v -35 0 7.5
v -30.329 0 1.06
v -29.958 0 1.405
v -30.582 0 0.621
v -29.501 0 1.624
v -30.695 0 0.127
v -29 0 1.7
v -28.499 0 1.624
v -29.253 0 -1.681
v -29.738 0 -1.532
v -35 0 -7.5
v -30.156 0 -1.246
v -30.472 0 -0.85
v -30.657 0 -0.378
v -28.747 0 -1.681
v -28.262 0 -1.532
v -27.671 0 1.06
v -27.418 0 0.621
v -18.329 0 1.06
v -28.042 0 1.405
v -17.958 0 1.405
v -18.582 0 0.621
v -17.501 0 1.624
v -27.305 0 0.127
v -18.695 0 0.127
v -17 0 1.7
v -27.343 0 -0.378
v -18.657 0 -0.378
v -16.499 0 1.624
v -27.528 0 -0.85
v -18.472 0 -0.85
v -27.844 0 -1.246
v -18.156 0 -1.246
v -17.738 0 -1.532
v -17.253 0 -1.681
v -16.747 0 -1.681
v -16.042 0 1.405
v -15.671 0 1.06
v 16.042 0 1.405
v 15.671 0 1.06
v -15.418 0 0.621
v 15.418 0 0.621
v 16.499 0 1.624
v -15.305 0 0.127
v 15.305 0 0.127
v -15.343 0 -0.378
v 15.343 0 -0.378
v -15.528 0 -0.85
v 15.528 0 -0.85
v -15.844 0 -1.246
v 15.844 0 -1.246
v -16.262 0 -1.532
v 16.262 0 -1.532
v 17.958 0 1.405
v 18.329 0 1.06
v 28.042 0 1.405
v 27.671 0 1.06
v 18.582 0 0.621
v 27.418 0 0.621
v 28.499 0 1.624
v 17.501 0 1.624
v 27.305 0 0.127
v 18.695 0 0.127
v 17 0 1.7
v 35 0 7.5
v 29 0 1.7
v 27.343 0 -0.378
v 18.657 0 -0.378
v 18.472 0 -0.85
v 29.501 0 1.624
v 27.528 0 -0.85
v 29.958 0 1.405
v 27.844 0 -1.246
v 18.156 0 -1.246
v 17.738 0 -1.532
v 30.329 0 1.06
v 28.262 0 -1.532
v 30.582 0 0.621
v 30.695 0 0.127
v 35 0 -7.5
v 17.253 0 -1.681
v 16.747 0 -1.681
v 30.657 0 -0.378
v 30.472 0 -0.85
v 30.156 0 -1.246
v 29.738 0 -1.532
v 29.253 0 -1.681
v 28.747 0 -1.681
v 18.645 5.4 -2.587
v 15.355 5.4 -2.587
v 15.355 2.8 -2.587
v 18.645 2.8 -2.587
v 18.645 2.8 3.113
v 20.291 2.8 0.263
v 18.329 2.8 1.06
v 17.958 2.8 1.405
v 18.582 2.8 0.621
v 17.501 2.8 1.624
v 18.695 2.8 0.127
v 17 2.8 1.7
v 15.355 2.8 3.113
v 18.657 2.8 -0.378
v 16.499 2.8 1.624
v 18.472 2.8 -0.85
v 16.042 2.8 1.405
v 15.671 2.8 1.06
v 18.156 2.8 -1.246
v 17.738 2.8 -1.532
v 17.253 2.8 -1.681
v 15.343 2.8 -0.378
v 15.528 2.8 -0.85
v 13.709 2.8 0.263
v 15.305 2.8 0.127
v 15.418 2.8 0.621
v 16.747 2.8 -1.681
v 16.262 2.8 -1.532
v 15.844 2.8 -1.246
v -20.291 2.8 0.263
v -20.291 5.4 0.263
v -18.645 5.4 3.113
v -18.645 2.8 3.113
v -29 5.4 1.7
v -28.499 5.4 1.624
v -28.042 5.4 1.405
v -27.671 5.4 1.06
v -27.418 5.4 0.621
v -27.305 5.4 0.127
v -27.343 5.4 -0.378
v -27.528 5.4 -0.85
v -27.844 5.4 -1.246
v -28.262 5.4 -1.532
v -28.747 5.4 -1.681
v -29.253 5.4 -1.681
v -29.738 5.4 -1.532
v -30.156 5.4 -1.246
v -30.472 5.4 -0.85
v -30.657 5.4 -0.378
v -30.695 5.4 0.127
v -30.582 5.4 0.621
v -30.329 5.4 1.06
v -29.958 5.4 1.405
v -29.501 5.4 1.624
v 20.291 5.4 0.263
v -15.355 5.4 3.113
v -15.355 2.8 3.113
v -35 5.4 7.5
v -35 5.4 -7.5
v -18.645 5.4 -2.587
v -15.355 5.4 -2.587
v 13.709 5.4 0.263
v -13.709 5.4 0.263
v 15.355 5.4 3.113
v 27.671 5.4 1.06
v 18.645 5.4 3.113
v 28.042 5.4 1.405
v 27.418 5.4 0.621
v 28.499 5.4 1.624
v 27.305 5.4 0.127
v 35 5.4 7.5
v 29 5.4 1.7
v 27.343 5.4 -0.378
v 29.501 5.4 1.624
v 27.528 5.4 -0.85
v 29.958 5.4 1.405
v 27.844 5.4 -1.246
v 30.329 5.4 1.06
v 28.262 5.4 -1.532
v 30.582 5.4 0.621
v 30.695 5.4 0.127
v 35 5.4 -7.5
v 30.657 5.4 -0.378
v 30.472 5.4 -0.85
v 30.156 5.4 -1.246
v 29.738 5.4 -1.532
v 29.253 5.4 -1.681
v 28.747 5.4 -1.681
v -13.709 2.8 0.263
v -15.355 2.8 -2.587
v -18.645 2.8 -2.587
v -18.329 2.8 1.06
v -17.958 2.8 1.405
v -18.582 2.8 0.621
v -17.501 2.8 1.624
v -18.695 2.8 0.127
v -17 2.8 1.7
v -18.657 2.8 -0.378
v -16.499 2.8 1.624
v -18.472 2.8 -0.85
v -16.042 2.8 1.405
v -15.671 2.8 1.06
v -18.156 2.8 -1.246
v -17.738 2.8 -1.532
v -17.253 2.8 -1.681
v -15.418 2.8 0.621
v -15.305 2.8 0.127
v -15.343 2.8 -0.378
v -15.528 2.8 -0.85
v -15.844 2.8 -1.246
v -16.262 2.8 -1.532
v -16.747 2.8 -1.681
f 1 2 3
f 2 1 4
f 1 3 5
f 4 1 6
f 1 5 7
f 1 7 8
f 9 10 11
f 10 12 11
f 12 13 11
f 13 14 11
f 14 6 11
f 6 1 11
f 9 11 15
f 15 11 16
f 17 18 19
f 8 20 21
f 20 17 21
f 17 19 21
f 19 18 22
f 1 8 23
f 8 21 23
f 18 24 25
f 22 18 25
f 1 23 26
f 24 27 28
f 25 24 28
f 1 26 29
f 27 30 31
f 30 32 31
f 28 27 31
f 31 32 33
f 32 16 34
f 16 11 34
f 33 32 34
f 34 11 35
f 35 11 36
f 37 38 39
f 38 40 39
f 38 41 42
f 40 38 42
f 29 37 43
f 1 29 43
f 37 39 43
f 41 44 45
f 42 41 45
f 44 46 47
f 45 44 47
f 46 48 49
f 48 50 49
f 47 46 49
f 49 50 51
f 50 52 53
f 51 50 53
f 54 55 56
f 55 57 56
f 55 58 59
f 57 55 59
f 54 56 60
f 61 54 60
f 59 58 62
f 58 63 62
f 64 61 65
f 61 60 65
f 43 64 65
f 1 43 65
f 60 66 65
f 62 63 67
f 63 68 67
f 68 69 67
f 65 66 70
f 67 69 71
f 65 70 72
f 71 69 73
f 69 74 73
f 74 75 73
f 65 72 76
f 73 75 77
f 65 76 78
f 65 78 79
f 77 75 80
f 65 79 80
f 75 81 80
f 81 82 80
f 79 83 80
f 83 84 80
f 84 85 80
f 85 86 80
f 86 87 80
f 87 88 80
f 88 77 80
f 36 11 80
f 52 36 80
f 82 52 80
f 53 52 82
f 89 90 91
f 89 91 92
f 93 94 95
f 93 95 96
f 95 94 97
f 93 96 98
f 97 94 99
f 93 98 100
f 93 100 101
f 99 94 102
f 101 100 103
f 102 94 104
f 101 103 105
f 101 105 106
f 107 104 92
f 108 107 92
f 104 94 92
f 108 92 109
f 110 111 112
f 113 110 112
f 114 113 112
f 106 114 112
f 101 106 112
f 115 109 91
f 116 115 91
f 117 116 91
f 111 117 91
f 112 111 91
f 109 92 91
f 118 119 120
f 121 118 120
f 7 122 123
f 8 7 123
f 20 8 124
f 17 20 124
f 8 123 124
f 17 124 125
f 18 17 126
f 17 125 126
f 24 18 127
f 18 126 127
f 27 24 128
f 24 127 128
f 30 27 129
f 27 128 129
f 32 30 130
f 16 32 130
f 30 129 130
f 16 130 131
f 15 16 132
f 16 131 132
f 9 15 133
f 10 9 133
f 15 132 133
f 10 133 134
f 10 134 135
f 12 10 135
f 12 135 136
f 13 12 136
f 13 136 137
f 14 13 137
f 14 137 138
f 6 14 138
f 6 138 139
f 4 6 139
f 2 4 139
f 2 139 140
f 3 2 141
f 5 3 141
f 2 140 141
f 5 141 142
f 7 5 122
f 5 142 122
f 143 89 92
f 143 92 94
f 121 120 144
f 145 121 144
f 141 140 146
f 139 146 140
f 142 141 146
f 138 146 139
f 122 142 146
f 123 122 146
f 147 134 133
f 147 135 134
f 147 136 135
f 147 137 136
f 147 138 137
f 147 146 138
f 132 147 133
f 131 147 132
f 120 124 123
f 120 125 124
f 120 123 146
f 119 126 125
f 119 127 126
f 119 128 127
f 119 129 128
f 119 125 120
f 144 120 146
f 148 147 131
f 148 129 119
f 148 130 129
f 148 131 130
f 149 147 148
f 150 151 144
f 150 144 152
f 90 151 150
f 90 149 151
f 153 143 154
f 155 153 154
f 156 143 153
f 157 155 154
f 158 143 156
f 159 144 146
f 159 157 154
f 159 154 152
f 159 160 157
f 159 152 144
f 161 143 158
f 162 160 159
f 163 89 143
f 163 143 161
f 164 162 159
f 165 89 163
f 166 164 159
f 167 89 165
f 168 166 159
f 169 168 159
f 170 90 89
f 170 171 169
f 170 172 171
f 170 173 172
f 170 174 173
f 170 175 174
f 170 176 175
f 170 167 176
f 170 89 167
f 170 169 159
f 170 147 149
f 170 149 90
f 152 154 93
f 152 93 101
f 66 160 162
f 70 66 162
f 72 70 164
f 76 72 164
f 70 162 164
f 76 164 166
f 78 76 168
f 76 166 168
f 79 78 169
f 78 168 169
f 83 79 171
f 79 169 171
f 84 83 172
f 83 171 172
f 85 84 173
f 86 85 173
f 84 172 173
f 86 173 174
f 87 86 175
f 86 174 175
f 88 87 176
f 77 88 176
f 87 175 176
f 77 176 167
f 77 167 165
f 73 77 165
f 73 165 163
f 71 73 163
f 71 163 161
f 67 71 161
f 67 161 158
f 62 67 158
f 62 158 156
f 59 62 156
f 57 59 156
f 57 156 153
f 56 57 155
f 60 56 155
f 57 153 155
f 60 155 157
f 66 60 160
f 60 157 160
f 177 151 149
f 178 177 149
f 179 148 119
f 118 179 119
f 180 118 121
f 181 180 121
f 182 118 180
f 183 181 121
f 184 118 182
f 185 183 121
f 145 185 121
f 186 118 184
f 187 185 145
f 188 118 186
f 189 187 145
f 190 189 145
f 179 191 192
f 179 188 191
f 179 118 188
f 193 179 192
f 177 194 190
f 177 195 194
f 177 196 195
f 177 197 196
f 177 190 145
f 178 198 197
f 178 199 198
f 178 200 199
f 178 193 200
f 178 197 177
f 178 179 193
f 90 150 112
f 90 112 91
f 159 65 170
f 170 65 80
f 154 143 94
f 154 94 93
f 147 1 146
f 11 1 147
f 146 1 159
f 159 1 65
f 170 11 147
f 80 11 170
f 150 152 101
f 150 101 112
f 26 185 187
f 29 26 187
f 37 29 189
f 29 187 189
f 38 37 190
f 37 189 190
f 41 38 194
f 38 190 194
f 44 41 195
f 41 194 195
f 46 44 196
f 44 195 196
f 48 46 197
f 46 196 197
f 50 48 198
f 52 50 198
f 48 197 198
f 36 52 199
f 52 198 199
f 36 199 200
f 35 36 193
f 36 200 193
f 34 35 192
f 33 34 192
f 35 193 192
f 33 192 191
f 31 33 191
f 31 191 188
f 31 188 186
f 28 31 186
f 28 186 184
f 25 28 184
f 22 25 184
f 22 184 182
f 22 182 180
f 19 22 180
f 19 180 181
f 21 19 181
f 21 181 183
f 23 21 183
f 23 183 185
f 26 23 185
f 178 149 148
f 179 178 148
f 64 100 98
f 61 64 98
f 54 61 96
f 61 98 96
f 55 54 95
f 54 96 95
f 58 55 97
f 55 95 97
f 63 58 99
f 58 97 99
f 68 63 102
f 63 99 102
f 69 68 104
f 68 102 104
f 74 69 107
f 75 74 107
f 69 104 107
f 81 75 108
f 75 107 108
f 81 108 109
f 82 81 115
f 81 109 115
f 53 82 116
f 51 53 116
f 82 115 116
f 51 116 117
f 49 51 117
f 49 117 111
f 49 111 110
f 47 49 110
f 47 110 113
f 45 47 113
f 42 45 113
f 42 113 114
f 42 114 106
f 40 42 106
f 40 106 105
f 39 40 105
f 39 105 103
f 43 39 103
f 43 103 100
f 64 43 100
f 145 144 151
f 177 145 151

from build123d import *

# Parameters (mm, degrees)
SKETCH1_W           = 70
SKETCH1_H           = 15
BOSS_EXTRUDE1_DEPTH = 5.4
CUT_EXTRUDE1_DEPTH  = 2.6
SKETCH4_R           = 1.7
CUT_EXTRUDE3_DEPTH  = 5.4


with BuildPart() as part:
    # Sketch1 → Boss-Extrude1 (new body)
    with BuildSketch(Plane(origin=(0, 0, 0), x_dir=(1, 0, 0), z_dir=(0, 1, 0))):
        Rectangle(SKETCH1_W, SKETCH1_H)
    extrude(amount=BOSS_EXTRUDE1_DEPTH)

    # Sketch2 → Cut-Extrude1 (cut)
    with BuildSketch(Plane(origin=(0, 5.4, 0), x_dir=(1, 0, 0), z_dir=(0, 1, 0))):
        Polygon((-15.354551733, 2.58658374), (-18.645448267, 2.58658374), (-20.290896534, -0.26341626), (-18.645448267, -3.11341626), (-15.354551733, -3.11341626), (-13.709103466, -0.26341626), align=None)
        Polygon((13.709103466, -0.26341626), (15.354551733, 2.58658374), (18.645448267, 2.58658374), (20.290896534, -0.26341626), (18.645448267, -3.11341626), (15.354551733, -3.11341626), align=None)
    extrude(amount=-CUT_EXTRUDE1_DEPTH, mode=Mode.SUBTRACT)

    # Sketch4 → Cut-Extrude3 (cut)
    with BuildSketch(Plane(origin=(0, 5.4, 0), x_dir=(1, 0, 0), z_dir=(0, 1, 0))):
        with Locations(Location((-29, 0, 0), (0, 0, 270))):
            Circle(SKETCH4_R)
        with Locations(Location((-17, 0, 0), (0, 0, 270))):
            Circle(SKETCH4_R)
        with Locations(Location((17, 0, 0), (0, 0, 270))):
            Circle(SKETCH4_R)
        with Locations(Location((29, 0, 0), (0, 0, 270))):
            Circle(SKETCH4_R)
    extrude(amount=-CUT_EXTRUDE3_DEPTH, mode=Mode.SUBTRACT)


solid = part.part
